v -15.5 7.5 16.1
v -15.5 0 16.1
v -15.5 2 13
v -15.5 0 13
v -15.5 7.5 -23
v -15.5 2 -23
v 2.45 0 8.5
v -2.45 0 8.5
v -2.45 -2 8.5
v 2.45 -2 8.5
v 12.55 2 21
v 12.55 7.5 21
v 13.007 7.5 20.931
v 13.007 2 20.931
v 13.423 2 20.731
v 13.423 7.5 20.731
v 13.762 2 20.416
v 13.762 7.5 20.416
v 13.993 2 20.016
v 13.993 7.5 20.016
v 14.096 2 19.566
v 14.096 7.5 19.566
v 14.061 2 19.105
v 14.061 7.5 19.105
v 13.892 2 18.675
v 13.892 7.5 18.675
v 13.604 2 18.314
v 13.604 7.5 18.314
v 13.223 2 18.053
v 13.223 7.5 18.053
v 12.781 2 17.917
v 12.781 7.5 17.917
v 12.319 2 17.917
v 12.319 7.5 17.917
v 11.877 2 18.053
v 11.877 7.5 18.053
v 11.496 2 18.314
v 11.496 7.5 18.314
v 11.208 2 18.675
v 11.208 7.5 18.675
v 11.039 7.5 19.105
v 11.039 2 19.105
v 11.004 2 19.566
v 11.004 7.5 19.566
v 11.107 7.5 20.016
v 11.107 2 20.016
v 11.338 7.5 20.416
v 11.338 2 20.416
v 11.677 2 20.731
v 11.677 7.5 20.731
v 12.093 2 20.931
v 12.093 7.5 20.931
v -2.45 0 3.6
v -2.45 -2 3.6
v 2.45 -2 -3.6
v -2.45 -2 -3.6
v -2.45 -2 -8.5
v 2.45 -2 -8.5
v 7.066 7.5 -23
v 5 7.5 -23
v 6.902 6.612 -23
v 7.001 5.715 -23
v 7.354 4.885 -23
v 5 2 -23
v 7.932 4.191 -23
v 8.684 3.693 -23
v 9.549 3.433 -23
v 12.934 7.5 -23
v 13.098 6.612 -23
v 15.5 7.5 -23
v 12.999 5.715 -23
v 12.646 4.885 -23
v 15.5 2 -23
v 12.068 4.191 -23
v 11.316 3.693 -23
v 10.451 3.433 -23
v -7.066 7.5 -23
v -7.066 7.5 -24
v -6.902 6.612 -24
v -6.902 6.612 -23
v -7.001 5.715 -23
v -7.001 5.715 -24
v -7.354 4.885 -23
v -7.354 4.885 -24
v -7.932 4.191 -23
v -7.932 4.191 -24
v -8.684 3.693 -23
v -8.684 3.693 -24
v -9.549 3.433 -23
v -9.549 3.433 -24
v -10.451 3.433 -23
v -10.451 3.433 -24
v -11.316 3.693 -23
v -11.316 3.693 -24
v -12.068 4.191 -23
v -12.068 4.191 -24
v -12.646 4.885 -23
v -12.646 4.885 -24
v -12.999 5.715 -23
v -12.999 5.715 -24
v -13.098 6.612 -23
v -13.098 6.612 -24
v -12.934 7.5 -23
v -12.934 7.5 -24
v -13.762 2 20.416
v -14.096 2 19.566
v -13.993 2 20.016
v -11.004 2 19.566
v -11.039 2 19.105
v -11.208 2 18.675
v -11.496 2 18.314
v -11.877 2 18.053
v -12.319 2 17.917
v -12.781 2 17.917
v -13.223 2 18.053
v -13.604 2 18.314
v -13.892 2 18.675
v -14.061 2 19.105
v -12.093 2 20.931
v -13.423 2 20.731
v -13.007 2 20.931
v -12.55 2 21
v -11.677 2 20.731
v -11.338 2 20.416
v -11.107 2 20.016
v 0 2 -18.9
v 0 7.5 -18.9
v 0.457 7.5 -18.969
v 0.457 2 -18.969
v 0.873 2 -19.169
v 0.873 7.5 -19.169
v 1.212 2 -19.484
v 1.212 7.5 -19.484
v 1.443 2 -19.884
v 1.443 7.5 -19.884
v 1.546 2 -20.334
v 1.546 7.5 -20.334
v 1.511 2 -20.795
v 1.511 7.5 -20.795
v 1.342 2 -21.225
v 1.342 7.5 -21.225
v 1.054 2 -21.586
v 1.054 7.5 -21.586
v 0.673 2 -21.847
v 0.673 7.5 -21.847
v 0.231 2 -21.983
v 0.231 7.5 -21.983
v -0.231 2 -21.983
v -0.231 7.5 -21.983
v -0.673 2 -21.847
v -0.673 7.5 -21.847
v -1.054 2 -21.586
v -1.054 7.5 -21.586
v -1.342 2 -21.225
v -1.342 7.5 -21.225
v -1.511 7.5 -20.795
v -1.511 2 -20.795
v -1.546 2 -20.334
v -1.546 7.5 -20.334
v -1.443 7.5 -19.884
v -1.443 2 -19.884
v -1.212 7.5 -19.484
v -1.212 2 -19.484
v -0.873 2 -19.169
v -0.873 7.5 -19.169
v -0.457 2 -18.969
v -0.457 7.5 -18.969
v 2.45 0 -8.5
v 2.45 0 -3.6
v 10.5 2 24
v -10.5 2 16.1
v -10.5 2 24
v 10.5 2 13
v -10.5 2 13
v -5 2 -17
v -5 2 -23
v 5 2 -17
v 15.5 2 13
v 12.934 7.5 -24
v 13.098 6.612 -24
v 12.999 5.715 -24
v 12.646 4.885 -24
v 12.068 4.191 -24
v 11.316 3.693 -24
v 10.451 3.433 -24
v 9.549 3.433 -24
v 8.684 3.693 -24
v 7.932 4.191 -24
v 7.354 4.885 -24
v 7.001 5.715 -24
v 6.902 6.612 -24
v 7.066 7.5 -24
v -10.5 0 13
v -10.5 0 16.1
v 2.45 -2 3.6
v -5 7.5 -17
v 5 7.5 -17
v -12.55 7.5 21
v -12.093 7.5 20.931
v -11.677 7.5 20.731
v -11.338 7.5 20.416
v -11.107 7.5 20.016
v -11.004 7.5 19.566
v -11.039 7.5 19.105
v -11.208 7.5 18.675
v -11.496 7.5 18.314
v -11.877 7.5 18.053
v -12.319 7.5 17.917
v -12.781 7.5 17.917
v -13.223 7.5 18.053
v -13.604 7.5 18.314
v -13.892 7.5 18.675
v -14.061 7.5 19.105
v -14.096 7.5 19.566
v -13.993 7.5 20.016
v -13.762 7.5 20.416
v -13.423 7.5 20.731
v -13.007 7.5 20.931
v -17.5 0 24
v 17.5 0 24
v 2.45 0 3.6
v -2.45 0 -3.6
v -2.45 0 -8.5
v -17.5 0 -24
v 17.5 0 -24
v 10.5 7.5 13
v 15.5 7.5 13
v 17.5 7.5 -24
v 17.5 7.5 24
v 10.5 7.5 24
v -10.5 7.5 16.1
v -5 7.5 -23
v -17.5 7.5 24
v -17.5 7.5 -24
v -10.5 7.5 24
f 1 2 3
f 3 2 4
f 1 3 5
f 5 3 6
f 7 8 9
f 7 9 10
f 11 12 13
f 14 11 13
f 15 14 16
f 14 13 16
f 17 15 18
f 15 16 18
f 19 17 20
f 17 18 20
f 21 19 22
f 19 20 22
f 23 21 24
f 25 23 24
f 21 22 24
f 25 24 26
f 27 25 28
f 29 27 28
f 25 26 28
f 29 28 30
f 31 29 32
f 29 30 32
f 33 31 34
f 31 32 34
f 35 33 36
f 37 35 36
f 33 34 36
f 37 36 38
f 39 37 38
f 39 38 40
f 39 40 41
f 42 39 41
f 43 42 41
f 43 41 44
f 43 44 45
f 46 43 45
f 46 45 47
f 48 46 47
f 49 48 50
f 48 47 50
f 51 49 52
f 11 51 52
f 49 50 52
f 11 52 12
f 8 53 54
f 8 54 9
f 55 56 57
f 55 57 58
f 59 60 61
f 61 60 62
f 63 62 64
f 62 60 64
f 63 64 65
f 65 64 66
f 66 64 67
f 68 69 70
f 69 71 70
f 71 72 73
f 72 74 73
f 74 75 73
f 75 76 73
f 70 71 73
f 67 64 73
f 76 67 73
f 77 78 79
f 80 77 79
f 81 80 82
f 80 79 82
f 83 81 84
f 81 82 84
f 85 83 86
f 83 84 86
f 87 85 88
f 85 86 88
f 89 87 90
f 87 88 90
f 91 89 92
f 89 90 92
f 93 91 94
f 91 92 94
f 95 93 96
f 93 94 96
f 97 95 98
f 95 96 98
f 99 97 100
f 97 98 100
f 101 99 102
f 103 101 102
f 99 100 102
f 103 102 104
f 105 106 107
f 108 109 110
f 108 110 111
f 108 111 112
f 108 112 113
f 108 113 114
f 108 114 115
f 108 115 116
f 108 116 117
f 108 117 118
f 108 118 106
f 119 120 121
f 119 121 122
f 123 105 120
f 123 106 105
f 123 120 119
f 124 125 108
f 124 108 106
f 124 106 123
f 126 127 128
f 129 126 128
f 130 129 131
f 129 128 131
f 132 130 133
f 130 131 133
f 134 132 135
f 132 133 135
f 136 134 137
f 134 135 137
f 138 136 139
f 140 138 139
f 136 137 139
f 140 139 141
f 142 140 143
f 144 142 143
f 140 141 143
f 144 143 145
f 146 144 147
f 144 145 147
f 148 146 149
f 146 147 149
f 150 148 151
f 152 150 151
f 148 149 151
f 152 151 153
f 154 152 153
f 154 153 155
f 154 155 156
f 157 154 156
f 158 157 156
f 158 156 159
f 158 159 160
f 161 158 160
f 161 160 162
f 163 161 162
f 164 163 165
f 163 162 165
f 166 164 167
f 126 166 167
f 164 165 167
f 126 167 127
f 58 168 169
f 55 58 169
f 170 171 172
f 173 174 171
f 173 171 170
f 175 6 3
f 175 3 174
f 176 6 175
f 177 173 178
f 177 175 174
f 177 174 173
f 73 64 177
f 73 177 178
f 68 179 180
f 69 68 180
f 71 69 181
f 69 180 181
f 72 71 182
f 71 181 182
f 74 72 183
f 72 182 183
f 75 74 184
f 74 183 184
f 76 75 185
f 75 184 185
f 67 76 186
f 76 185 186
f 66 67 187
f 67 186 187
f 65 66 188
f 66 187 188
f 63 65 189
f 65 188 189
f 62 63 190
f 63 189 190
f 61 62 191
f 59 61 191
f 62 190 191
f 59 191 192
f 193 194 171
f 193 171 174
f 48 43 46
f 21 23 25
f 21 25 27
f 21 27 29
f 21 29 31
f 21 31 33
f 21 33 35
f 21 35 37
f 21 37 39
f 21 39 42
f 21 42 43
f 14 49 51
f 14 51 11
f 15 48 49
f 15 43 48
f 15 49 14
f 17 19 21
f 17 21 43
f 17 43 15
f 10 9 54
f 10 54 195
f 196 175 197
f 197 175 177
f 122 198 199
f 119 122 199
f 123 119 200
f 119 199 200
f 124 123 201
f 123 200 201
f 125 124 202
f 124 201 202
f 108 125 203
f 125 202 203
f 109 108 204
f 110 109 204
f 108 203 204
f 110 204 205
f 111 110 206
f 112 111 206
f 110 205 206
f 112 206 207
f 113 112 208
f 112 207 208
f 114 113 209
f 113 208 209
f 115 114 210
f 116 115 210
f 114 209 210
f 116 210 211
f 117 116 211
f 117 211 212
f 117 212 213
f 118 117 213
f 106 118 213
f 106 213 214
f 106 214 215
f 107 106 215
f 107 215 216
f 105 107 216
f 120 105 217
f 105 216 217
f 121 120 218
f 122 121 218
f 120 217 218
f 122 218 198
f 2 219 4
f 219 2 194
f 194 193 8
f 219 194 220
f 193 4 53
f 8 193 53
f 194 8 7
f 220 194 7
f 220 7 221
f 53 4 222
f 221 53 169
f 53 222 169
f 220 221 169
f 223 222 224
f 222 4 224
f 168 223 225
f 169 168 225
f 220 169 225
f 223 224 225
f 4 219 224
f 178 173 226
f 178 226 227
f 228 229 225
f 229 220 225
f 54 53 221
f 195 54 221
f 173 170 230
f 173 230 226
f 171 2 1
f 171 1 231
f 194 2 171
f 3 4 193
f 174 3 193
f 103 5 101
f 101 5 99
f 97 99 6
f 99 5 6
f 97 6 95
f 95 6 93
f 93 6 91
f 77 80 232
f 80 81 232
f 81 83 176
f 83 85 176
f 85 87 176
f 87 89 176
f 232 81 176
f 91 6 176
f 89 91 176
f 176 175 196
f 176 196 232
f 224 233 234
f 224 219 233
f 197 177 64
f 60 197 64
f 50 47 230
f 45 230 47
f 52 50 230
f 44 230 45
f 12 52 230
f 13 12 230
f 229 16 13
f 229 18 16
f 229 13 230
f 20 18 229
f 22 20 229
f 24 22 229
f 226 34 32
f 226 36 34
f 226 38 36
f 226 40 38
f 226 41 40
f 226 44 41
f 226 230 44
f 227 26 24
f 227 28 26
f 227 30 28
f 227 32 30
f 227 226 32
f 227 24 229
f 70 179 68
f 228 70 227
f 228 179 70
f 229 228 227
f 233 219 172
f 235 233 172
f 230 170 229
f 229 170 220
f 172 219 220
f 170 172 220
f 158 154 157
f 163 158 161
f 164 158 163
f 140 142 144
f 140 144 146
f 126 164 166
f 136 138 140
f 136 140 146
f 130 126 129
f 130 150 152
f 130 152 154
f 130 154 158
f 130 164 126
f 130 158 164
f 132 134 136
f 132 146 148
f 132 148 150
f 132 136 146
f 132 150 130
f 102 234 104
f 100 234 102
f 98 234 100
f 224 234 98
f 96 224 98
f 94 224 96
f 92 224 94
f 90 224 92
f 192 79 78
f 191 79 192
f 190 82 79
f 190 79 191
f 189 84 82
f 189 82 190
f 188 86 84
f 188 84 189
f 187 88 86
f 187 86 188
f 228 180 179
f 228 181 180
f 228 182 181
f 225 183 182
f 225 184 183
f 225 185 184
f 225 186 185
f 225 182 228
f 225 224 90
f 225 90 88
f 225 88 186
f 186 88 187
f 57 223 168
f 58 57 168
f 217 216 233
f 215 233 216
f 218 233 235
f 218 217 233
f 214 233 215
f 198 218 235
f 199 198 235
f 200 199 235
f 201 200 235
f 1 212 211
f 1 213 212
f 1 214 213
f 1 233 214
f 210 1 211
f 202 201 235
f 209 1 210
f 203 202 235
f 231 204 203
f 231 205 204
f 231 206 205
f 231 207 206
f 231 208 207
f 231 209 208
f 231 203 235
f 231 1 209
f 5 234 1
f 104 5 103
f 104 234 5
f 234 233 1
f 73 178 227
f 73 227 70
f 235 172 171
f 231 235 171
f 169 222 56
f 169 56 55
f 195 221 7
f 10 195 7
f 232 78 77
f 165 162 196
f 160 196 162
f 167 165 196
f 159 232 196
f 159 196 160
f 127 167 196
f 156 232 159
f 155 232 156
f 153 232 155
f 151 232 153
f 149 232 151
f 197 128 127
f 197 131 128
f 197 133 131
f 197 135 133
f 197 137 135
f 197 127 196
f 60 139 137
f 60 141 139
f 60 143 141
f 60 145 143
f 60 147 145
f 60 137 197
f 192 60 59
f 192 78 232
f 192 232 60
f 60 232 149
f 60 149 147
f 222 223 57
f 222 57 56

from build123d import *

# Parameters (mm, degrees)
SKETCH1_W           = 35
SKETCH1_H           = 48
BOSS_EXTRUDE1_DEPTH = 2
SKETCH2_W           = 35
SKETCH2_H           = 48
SKETCH2_W_2         = 31
SKETCH2_H_2         = 44
BOSS_EXTRUDE2_DEPTH = 5.5
SKETCH3_W           = 10
SKETCH3_H           = 6
SKETCH3_W_2         = 5
SKETCH3_H_2         = 8
BOSS_EXTRUDE3_DEPTH = 5.5
SKETCH4_W           = 21
SKETCH4_H           = 5.5
CUT_EXTRUDE1_DEPTH  = 3
SKETCH5_W           = 4.9
SKETCH5_H           = 4.9
BOSS_EXTRUDE4_DEPTH = 2
CUT_EXTRUDE2_DEPTH  = 2
CUT_EXTRUDE3_START  = -7.5
SKETCH7_W           = 5
SKETCH7_H           = 3.1
CUT_EXTRUDE3_DEPTH  = 7.5
CUT_EXTRUDE4_START  = 7.5
SKETCH8_R           = 1.55
CUT_EXTRUDE4_DEPTH  = 5.5


with BuildPart() as part:
    # Sketch1 → Boss-Extrude1 (new body)
    with BuildSketch(Plane(origin=(0, 0, 0), x_dir=(1, 0, 0), z_dir=(0, 1, 0))):
        Rectangle(SKETCH1_W, SKETCH1_H)
    extrude(amount=BOSS_EXTRUDE1_DEPTH)

    # Sketch2 → Boss-Extrude2 (add)
    with BuildSketch(Plane(origin=(0, 2, 0), x_dir=(1, 0, 0), z_dir=(0, 1, 0))):
        Rectangle(SKETCH2_W, SKETCH2_H)
        with Locations((0, 1)):
            Rectangle(SKETCH2_W_2, SKETCH2_H_2, mode=Mode.SUBTRACT)
    extrude(amount=BOSS_EXTRUDE2_DEPTH)

    # Sketch3 → Boss-Extrude3 (add)
    with BuildSketch(Plane(origin=(0, 2, 0), x_dir=(1, 0, 0), z_dir=(0, 1, 0))):
        with Locations((0, 20)):
            Rectangle(SKETCH3_W, SKETCH3_H)
        with Locations((-13, -17)):
            Rectangle(SKETCH3_W_2, SKETCH3_H_2)
        with Locations((13, -17)):
            Rectangle(SKETCH3_W_2, SKETCH3_H_2)
    extrude(amount=BOSS_EXTRUDE3_DEPTH)

    # Sketch4 → Cut-Extrude1 (cut)
    with BuildSketch(Plane.XY.offset(24)):
        with Locations((0, 4.75)):
            Rectangle(SKETCH4_W, SKETCH4_H)
    extrude(amount=-CUT_EXTRUDE1_DEPTH, mode=Mode.SUBTRACT)

    # Sketch5 → Boss-Extrude4 (add)
    with BuildSketch(Plane.XZ):
        with Locations((0, 6.05)):
            Rectangle(SKETCH5_W, SKETCH5_H)
        with Locations((0, -6.05)):
            Rectangle(SKETCH5_W, SKETCH5_H)
    extrude(amount=BOSS_EXTRUDE4_DEPTH)

    # Sketch6 → Cut-Extrude2 (cut)
    with BuildSketch(Plane(origin=(0, 0, -24), x_dir=(-1, 0, 0), z_dir=(0, 0, -1))):
        with BuildLine():
            ThreePointArc((-12.93428015, 7.5), (-10, 3.4), (-7.06571985, 7.5))
            Line((-7.06571985, 7.5), (-12.93428015, 7.5))
        make_face()
        with BuildLine():
            Line((12.93428015, 7.5), (7.06571985, 7.5))
            ThreePointArc((7.06571985, 7.5), (10, 3.4), (12.93428015, 7.5))
        make_face()
    extrude(amount=-CUT_EXTRUDE2_DEPTH, mode=Mode.SUBTRACT)

    # Sketch7 → Cut-Extrude3 (cut)
    with BuildSketch(Plane(origin=(0, 7.5, 0), x_dir=(1, 0, 0), z_dir=(0, 1, 0)).offset(CUT_EXTRUDE3_START)):
        with Locations((-13, -14.55)):
            Rectangle(SKETCH7_W, SKETCH7_H)
    extrude(amount=CUT_EXTRUDE3_DEPTH, mode=Mode.SUBTRACT)

    # Sketch8 → Cut-Extrude4 (cut)
    with BuildSketch(Plane(origin=(0, 0, 0), x_dir=(1, 0, 0), z_dir=(0, 1, 0)).offset(CUT_EXTRUDE4_START)):
        with Locations(Location((-12.55, -19.45, 0), (0, 0, 270))):
            Circle(SKETCH8_R)
        with Locations(Location((12.55, -19.45, 0), (0, 0, 270))):
            Circle(SKETCH8_R)
        with Locations(Location((0, 20.45, 0), (0, 0, 270))):
            Circle(SKETCH8_R)
    extrude(amount=-CUT_EXTRUDE4_DEPTH, mode=Mode.SUBTRACT)


solid = part.part
